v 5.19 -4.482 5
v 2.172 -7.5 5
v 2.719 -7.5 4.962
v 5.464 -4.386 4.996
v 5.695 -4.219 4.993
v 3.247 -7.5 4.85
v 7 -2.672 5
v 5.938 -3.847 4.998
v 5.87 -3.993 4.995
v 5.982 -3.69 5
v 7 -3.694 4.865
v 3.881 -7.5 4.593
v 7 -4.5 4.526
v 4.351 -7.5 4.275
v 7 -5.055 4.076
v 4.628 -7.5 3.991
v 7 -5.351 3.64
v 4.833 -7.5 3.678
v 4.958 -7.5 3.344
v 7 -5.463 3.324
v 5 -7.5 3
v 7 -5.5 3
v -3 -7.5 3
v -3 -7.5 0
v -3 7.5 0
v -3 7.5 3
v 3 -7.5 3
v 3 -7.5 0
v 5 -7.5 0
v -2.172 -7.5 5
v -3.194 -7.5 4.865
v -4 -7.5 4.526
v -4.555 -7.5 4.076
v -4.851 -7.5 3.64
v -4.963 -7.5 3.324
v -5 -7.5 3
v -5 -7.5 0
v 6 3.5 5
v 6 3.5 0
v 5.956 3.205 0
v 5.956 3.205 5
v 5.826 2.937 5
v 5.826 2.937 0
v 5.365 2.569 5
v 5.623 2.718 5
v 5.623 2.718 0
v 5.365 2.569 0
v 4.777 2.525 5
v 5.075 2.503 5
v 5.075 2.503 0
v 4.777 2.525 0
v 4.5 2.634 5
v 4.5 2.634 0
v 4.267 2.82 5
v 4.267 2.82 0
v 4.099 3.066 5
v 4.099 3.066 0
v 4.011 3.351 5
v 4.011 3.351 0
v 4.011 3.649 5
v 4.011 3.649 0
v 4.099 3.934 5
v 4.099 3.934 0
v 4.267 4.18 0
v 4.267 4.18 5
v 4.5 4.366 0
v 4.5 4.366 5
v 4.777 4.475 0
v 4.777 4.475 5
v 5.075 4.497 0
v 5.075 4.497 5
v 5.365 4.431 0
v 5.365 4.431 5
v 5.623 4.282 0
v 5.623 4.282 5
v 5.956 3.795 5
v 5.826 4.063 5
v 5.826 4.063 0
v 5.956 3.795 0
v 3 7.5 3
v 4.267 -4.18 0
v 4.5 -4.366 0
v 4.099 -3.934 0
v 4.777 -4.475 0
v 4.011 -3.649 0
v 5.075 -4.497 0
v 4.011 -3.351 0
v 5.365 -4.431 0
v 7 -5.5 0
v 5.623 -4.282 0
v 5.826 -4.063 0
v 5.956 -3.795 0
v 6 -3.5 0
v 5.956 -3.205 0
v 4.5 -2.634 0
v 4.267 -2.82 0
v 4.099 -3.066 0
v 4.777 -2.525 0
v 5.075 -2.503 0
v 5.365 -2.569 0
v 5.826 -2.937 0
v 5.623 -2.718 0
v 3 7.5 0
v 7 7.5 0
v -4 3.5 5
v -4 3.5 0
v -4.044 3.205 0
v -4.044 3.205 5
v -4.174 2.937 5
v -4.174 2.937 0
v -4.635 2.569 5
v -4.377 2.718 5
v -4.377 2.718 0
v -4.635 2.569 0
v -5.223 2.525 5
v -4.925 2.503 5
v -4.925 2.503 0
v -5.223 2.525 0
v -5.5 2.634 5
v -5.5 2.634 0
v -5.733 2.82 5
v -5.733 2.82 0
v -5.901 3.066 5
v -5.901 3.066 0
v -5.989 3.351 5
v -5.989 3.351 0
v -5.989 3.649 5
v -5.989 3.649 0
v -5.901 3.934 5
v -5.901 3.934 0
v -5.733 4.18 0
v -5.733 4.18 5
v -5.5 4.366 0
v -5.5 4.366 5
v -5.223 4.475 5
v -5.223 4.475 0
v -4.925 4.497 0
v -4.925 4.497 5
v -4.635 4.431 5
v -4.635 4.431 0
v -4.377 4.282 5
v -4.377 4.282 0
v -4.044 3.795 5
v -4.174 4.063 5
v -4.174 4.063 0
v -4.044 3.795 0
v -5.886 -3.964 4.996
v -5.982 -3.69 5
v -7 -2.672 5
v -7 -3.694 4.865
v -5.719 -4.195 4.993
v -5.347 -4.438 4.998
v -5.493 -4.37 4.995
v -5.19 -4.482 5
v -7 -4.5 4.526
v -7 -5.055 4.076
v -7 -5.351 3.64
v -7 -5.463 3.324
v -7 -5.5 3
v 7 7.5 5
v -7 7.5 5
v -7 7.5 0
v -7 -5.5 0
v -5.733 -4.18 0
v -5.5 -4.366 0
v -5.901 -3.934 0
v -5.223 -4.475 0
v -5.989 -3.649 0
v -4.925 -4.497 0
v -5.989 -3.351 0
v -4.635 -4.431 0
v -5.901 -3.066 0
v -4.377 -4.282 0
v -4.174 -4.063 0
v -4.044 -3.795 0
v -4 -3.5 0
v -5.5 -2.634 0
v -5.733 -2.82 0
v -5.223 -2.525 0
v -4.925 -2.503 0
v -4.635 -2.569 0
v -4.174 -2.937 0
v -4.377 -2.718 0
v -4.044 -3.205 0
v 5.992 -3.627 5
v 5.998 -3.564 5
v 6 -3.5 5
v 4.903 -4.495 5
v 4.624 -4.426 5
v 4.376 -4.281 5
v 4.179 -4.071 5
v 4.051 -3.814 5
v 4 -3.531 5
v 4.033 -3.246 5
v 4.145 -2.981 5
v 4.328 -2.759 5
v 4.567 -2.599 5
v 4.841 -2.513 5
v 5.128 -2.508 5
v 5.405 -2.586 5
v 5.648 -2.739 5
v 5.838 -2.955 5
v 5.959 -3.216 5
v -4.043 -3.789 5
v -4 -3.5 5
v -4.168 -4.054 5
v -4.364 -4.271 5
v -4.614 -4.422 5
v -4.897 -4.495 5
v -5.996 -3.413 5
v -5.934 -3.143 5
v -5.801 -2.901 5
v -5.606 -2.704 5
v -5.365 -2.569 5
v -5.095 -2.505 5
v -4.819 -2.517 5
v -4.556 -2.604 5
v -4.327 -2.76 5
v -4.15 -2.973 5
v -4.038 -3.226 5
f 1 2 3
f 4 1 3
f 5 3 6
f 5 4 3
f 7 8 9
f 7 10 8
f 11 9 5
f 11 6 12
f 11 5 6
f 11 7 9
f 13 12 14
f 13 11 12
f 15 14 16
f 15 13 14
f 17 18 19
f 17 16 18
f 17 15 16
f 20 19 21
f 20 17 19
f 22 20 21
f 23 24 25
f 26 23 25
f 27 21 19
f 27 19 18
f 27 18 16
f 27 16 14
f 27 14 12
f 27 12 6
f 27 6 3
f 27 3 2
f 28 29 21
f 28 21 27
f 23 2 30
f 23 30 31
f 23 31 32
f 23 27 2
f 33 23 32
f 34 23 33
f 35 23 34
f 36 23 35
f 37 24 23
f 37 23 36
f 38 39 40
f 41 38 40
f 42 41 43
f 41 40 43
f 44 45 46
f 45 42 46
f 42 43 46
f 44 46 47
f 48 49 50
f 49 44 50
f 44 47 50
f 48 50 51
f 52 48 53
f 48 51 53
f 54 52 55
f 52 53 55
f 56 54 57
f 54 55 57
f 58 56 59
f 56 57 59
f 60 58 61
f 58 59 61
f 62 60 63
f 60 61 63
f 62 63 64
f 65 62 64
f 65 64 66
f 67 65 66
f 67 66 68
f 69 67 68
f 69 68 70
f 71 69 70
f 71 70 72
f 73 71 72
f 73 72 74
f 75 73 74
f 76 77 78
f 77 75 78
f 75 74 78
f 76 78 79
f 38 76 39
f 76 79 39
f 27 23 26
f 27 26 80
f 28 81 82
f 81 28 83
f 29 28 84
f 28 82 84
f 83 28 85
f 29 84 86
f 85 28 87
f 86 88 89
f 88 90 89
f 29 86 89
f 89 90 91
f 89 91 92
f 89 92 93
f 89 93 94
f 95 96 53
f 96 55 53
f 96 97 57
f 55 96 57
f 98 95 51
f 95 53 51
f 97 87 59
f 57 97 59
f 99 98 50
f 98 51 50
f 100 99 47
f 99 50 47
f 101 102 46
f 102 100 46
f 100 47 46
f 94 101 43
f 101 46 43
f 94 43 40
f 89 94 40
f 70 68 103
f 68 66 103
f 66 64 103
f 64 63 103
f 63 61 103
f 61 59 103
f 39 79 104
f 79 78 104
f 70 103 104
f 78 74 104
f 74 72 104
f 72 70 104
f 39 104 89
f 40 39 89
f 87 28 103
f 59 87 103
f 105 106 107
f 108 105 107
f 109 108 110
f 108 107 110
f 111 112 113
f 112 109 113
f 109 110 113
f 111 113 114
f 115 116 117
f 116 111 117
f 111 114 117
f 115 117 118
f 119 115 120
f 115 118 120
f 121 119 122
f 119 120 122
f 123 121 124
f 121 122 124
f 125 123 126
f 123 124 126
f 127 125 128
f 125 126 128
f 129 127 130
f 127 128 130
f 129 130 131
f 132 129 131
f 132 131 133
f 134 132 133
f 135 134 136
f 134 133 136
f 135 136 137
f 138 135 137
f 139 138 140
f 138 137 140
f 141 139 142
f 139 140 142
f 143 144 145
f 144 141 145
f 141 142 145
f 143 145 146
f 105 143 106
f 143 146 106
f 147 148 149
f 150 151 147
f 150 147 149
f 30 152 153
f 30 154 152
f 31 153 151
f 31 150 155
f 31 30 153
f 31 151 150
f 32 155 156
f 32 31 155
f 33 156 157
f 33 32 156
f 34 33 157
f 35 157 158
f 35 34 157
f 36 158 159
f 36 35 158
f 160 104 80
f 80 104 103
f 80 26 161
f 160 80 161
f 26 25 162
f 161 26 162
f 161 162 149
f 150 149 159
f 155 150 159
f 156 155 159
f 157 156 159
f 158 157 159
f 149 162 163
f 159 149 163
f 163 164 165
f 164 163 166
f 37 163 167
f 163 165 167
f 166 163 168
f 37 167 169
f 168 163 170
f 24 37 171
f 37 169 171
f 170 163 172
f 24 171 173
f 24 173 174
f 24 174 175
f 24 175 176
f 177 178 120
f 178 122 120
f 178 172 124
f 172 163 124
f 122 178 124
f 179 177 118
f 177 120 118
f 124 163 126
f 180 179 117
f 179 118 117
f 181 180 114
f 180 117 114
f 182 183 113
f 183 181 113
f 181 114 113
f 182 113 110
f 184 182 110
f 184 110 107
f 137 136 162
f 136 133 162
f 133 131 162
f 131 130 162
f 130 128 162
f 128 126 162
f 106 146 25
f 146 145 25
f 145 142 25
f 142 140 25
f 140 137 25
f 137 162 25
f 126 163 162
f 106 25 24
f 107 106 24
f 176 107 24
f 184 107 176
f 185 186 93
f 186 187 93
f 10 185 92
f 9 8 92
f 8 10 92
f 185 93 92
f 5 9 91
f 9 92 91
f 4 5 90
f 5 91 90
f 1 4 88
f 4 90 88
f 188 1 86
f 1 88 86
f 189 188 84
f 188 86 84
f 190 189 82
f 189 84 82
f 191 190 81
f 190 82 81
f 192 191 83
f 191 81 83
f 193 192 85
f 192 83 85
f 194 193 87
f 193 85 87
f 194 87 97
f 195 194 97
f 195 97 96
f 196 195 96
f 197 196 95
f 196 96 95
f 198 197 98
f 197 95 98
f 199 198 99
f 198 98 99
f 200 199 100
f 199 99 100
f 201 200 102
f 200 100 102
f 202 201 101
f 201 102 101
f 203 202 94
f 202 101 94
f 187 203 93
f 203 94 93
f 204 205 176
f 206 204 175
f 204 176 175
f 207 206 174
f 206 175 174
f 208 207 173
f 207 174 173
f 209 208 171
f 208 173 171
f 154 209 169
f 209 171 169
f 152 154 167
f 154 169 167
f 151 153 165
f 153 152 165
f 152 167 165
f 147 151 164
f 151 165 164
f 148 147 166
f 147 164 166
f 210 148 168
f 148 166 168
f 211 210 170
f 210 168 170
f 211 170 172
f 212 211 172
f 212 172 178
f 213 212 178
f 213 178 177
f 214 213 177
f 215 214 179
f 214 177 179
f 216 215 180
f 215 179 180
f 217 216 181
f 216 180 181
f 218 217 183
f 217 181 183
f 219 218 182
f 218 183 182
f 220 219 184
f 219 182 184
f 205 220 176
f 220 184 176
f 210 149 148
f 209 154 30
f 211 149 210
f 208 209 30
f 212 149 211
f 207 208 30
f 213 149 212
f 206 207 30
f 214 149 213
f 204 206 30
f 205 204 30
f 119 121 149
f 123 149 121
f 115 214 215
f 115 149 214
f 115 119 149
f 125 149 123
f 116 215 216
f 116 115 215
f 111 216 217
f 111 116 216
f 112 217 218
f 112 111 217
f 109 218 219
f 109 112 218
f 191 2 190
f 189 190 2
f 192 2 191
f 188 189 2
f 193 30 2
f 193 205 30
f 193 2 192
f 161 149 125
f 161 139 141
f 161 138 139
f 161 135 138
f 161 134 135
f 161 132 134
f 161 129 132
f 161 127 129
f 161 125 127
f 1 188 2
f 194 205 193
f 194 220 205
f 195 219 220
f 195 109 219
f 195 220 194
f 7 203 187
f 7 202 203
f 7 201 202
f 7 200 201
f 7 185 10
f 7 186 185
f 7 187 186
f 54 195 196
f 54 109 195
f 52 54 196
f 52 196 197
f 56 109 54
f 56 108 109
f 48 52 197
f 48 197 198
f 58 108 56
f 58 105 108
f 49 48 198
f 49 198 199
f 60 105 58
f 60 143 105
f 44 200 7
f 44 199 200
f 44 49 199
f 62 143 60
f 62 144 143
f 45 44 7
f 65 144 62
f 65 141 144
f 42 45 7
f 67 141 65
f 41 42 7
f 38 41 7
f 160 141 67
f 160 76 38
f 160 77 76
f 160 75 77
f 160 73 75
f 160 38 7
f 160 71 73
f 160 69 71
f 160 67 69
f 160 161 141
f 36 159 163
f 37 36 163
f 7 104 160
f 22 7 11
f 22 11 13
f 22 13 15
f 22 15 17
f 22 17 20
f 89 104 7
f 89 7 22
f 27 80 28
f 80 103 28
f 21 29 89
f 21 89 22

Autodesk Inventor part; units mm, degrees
ref_plane "YZ Plane" through (0, 0, 0) normal (1, 0, 0) x (0, 1, 0)
ref_plane "XZ Plane" through (0, 0, 0) normal (0, 1, 0) x (-1, 0, 0)
ref_plane "XY Plane" through (0, 0, 0) normal (0, 0, 1) x (1, 0, 0)
sketch "Sketch1" plane through (0, 0, 0) normal (0, 0, 1) x (1, 0, 0)
  line L0 (7, 7.5) -> (3, 7.5) projected
  line L1 (3, 7.5) -> (3, -7.5) projected
  line L2 (7, -7.5) -> (3, -7.5) projected
  line L3 (7, 7.5) -> (7, -7.5) projected
  circle A0 centre (5, -3.5) radius 1 projected
  circle A1 centre (5, 3.5) radius 1 projected
  line L4 (-3, 7.5) -> (-7, 7.5) projected
  line L5 (-7, -7.5) -> (-7, 7.5) projected
  line L6 (-3, -7.5) -> (-7, -7.5) projected
  line L7 (-3, -7.5) -> (-3, 7.5) projected
  circle A2 centre (-5, 3.5) radius 1 projected
  circle A3 centre (-5, -3.5) radius 1 projected
  point P0 (0, 0)
extrude "Extrusion1" add sketch "Sketch1" along normal blind 3
sketch "Sketch2" plane through (0, 0, 3) normal (0, 0, 1) x (1, 0, 0)
  line L0 (7, -7.5) -> (7, 7.5) projected
  line L1 (7, 7.5) -> (3, 7.5) projected
  line L2 (3, 7.5) -> (3, -7.5) projected
  line L3 (3, -7.5) -> (7, -7.5) projected
  circle A0 centre (5, -3.5) radius 1 projected
  circle A1 centre (5, 3.5) radius 1 projected
  line L4 (-3, -7.5) -> (-3, 7.5) projected
  line L5 (-3, 7.5) -> (-7, 7.5) projected
  line L6 (-7, 7.5) -> (-7, -7.5) projected
  line L7 (-7, -7.5) -> (-3, -7.5) projected
  circle A2 centre (-5, 3.5) radius 1 projected
  circle A3 centre (-5, -3.5) radius 1 projected
  line L8 (7, -7.5) -> (-7, -7.5)
  line L9 (-7, -7.5) -> (-7, 7.5)
  line L10 (-7, 7.5) -> (7, 7.5)
  line L11 (7, 7.5) -> (7, -7.5)
  point P0 (0, 0)
extrude "Extrusion2" add sketch "Sketch2" along normal blind 2
chamfer "Chamfer1" distance 2 angle 45 2 edges at (7, -7.5, 2.5) (-7, -7.5, 2.5)
fillet "Fillet1" radius 2 2 edges at (6, -6.5, 5) (-6, -6.5, 5)
properties part number "sub_arm_2"
